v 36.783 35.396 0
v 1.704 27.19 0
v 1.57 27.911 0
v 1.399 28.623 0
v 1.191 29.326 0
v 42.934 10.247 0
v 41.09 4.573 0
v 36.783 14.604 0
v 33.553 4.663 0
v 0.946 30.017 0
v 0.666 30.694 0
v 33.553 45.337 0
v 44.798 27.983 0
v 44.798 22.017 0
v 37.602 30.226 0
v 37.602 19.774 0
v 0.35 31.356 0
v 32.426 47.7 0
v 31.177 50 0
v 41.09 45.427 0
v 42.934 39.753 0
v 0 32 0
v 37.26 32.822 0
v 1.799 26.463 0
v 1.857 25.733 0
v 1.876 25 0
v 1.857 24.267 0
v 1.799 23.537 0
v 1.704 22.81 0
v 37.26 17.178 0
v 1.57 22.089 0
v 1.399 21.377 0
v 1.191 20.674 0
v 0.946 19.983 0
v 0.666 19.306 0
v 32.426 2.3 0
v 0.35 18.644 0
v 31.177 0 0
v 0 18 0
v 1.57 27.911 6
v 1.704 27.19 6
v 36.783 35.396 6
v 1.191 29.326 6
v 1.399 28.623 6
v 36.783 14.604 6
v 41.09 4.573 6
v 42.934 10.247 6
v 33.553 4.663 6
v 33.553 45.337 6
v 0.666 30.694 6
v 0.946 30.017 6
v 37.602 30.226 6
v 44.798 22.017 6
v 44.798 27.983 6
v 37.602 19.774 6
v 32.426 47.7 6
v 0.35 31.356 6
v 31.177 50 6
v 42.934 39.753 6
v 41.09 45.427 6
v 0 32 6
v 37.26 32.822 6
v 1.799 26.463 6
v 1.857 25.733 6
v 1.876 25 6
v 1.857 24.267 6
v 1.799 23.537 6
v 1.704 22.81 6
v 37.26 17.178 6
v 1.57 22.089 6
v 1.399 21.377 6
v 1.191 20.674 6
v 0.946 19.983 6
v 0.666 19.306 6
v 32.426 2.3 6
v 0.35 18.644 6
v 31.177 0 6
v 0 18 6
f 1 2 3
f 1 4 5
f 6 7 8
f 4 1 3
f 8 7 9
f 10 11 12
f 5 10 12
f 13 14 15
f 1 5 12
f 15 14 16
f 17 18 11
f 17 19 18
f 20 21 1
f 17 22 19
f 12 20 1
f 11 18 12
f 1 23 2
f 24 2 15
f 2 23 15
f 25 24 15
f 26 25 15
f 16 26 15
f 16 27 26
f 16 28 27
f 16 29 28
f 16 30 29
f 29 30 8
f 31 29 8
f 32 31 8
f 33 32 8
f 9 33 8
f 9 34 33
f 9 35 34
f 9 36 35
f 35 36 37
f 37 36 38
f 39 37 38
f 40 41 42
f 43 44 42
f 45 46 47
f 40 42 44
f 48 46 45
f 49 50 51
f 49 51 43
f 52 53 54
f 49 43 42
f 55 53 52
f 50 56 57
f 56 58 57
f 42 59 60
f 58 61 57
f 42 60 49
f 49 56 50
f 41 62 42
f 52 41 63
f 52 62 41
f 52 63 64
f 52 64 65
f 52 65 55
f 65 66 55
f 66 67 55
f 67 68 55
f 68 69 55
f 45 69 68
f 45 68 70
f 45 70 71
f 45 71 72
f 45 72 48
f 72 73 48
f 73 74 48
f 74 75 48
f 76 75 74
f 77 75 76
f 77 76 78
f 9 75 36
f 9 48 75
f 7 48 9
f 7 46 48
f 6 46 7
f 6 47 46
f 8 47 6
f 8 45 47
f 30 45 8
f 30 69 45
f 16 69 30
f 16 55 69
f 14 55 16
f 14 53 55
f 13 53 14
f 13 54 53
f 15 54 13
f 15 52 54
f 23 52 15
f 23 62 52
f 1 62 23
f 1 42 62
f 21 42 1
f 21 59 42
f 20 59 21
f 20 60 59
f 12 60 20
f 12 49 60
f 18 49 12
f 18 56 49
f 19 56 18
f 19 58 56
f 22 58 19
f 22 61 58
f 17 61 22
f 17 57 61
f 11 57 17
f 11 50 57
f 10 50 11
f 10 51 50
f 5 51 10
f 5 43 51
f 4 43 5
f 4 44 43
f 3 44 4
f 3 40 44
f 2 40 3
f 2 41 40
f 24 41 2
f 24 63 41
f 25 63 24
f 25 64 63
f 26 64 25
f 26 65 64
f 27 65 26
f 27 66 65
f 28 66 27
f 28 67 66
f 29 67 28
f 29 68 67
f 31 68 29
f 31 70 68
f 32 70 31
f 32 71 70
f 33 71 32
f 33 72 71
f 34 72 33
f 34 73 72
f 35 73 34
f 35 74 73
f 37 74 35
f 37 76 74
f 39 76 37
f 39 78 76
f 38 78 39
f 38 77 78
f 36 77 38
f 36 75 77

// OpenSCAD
$fn = 32;

// ----------------------------------------------------------------------
// Gear sector: 3 teeth on 60 degrees
// ----------------------------------------------------------------------

// --- parameters (mm) ---
sector_angle = 60;        // sector angle, degrees
root_r = 50;              // root circle radius
tooth_h = 7;              // tooth height over the root circle
teeth = 3;                // number of teeth on the sector
hub_r = 14;               // hub bore radius
plate_t = 6;              // sector thickness, Z
arc_step = 3;             // sampling step of the root/hub arcs, degrees

tip_r = root_r + tooth_h;  // tip circle radius

profile = [[31.177, 0], [32.426, 2.3], [33.553, 4.663], [41.09, 4.573], [42.934, 10.247], [36.783, 14.604], [37.26, 17.178], [37.602, 19.774], [44.798, 22.017], [44.798, 27.983], [37.602, 30.226], [37.26, 32.822], [36.783, 35.396], [42.934, 39.753], [41.09, 45.427], [33.553, 45.337], [32.426, 47.7], [31.177, 50], [0, 32], [0.35, 31.356], [0.666, 30.694], [0.946, 30.017], [1.191, 29.326], [1.399, 28.623], [1.57, 27.911], [1.704, 27.19], [1.799, 26.463], [1.857, 25.733], [1.876, 25], [1.857, 24.267], [1.799, 23.537], [1.704, 22.81], [1.57, 22.089], [1.399, 21.377], [1.191, 20.674], [0.946, 19.983], [0.666, 19.306], [0.35, 18.644], [0, 18]];  // primary outline, 39 points, counter clockwise

// --- the one profile operation ---
linear_extrude(height = plate_t) polygon(points = profile);
